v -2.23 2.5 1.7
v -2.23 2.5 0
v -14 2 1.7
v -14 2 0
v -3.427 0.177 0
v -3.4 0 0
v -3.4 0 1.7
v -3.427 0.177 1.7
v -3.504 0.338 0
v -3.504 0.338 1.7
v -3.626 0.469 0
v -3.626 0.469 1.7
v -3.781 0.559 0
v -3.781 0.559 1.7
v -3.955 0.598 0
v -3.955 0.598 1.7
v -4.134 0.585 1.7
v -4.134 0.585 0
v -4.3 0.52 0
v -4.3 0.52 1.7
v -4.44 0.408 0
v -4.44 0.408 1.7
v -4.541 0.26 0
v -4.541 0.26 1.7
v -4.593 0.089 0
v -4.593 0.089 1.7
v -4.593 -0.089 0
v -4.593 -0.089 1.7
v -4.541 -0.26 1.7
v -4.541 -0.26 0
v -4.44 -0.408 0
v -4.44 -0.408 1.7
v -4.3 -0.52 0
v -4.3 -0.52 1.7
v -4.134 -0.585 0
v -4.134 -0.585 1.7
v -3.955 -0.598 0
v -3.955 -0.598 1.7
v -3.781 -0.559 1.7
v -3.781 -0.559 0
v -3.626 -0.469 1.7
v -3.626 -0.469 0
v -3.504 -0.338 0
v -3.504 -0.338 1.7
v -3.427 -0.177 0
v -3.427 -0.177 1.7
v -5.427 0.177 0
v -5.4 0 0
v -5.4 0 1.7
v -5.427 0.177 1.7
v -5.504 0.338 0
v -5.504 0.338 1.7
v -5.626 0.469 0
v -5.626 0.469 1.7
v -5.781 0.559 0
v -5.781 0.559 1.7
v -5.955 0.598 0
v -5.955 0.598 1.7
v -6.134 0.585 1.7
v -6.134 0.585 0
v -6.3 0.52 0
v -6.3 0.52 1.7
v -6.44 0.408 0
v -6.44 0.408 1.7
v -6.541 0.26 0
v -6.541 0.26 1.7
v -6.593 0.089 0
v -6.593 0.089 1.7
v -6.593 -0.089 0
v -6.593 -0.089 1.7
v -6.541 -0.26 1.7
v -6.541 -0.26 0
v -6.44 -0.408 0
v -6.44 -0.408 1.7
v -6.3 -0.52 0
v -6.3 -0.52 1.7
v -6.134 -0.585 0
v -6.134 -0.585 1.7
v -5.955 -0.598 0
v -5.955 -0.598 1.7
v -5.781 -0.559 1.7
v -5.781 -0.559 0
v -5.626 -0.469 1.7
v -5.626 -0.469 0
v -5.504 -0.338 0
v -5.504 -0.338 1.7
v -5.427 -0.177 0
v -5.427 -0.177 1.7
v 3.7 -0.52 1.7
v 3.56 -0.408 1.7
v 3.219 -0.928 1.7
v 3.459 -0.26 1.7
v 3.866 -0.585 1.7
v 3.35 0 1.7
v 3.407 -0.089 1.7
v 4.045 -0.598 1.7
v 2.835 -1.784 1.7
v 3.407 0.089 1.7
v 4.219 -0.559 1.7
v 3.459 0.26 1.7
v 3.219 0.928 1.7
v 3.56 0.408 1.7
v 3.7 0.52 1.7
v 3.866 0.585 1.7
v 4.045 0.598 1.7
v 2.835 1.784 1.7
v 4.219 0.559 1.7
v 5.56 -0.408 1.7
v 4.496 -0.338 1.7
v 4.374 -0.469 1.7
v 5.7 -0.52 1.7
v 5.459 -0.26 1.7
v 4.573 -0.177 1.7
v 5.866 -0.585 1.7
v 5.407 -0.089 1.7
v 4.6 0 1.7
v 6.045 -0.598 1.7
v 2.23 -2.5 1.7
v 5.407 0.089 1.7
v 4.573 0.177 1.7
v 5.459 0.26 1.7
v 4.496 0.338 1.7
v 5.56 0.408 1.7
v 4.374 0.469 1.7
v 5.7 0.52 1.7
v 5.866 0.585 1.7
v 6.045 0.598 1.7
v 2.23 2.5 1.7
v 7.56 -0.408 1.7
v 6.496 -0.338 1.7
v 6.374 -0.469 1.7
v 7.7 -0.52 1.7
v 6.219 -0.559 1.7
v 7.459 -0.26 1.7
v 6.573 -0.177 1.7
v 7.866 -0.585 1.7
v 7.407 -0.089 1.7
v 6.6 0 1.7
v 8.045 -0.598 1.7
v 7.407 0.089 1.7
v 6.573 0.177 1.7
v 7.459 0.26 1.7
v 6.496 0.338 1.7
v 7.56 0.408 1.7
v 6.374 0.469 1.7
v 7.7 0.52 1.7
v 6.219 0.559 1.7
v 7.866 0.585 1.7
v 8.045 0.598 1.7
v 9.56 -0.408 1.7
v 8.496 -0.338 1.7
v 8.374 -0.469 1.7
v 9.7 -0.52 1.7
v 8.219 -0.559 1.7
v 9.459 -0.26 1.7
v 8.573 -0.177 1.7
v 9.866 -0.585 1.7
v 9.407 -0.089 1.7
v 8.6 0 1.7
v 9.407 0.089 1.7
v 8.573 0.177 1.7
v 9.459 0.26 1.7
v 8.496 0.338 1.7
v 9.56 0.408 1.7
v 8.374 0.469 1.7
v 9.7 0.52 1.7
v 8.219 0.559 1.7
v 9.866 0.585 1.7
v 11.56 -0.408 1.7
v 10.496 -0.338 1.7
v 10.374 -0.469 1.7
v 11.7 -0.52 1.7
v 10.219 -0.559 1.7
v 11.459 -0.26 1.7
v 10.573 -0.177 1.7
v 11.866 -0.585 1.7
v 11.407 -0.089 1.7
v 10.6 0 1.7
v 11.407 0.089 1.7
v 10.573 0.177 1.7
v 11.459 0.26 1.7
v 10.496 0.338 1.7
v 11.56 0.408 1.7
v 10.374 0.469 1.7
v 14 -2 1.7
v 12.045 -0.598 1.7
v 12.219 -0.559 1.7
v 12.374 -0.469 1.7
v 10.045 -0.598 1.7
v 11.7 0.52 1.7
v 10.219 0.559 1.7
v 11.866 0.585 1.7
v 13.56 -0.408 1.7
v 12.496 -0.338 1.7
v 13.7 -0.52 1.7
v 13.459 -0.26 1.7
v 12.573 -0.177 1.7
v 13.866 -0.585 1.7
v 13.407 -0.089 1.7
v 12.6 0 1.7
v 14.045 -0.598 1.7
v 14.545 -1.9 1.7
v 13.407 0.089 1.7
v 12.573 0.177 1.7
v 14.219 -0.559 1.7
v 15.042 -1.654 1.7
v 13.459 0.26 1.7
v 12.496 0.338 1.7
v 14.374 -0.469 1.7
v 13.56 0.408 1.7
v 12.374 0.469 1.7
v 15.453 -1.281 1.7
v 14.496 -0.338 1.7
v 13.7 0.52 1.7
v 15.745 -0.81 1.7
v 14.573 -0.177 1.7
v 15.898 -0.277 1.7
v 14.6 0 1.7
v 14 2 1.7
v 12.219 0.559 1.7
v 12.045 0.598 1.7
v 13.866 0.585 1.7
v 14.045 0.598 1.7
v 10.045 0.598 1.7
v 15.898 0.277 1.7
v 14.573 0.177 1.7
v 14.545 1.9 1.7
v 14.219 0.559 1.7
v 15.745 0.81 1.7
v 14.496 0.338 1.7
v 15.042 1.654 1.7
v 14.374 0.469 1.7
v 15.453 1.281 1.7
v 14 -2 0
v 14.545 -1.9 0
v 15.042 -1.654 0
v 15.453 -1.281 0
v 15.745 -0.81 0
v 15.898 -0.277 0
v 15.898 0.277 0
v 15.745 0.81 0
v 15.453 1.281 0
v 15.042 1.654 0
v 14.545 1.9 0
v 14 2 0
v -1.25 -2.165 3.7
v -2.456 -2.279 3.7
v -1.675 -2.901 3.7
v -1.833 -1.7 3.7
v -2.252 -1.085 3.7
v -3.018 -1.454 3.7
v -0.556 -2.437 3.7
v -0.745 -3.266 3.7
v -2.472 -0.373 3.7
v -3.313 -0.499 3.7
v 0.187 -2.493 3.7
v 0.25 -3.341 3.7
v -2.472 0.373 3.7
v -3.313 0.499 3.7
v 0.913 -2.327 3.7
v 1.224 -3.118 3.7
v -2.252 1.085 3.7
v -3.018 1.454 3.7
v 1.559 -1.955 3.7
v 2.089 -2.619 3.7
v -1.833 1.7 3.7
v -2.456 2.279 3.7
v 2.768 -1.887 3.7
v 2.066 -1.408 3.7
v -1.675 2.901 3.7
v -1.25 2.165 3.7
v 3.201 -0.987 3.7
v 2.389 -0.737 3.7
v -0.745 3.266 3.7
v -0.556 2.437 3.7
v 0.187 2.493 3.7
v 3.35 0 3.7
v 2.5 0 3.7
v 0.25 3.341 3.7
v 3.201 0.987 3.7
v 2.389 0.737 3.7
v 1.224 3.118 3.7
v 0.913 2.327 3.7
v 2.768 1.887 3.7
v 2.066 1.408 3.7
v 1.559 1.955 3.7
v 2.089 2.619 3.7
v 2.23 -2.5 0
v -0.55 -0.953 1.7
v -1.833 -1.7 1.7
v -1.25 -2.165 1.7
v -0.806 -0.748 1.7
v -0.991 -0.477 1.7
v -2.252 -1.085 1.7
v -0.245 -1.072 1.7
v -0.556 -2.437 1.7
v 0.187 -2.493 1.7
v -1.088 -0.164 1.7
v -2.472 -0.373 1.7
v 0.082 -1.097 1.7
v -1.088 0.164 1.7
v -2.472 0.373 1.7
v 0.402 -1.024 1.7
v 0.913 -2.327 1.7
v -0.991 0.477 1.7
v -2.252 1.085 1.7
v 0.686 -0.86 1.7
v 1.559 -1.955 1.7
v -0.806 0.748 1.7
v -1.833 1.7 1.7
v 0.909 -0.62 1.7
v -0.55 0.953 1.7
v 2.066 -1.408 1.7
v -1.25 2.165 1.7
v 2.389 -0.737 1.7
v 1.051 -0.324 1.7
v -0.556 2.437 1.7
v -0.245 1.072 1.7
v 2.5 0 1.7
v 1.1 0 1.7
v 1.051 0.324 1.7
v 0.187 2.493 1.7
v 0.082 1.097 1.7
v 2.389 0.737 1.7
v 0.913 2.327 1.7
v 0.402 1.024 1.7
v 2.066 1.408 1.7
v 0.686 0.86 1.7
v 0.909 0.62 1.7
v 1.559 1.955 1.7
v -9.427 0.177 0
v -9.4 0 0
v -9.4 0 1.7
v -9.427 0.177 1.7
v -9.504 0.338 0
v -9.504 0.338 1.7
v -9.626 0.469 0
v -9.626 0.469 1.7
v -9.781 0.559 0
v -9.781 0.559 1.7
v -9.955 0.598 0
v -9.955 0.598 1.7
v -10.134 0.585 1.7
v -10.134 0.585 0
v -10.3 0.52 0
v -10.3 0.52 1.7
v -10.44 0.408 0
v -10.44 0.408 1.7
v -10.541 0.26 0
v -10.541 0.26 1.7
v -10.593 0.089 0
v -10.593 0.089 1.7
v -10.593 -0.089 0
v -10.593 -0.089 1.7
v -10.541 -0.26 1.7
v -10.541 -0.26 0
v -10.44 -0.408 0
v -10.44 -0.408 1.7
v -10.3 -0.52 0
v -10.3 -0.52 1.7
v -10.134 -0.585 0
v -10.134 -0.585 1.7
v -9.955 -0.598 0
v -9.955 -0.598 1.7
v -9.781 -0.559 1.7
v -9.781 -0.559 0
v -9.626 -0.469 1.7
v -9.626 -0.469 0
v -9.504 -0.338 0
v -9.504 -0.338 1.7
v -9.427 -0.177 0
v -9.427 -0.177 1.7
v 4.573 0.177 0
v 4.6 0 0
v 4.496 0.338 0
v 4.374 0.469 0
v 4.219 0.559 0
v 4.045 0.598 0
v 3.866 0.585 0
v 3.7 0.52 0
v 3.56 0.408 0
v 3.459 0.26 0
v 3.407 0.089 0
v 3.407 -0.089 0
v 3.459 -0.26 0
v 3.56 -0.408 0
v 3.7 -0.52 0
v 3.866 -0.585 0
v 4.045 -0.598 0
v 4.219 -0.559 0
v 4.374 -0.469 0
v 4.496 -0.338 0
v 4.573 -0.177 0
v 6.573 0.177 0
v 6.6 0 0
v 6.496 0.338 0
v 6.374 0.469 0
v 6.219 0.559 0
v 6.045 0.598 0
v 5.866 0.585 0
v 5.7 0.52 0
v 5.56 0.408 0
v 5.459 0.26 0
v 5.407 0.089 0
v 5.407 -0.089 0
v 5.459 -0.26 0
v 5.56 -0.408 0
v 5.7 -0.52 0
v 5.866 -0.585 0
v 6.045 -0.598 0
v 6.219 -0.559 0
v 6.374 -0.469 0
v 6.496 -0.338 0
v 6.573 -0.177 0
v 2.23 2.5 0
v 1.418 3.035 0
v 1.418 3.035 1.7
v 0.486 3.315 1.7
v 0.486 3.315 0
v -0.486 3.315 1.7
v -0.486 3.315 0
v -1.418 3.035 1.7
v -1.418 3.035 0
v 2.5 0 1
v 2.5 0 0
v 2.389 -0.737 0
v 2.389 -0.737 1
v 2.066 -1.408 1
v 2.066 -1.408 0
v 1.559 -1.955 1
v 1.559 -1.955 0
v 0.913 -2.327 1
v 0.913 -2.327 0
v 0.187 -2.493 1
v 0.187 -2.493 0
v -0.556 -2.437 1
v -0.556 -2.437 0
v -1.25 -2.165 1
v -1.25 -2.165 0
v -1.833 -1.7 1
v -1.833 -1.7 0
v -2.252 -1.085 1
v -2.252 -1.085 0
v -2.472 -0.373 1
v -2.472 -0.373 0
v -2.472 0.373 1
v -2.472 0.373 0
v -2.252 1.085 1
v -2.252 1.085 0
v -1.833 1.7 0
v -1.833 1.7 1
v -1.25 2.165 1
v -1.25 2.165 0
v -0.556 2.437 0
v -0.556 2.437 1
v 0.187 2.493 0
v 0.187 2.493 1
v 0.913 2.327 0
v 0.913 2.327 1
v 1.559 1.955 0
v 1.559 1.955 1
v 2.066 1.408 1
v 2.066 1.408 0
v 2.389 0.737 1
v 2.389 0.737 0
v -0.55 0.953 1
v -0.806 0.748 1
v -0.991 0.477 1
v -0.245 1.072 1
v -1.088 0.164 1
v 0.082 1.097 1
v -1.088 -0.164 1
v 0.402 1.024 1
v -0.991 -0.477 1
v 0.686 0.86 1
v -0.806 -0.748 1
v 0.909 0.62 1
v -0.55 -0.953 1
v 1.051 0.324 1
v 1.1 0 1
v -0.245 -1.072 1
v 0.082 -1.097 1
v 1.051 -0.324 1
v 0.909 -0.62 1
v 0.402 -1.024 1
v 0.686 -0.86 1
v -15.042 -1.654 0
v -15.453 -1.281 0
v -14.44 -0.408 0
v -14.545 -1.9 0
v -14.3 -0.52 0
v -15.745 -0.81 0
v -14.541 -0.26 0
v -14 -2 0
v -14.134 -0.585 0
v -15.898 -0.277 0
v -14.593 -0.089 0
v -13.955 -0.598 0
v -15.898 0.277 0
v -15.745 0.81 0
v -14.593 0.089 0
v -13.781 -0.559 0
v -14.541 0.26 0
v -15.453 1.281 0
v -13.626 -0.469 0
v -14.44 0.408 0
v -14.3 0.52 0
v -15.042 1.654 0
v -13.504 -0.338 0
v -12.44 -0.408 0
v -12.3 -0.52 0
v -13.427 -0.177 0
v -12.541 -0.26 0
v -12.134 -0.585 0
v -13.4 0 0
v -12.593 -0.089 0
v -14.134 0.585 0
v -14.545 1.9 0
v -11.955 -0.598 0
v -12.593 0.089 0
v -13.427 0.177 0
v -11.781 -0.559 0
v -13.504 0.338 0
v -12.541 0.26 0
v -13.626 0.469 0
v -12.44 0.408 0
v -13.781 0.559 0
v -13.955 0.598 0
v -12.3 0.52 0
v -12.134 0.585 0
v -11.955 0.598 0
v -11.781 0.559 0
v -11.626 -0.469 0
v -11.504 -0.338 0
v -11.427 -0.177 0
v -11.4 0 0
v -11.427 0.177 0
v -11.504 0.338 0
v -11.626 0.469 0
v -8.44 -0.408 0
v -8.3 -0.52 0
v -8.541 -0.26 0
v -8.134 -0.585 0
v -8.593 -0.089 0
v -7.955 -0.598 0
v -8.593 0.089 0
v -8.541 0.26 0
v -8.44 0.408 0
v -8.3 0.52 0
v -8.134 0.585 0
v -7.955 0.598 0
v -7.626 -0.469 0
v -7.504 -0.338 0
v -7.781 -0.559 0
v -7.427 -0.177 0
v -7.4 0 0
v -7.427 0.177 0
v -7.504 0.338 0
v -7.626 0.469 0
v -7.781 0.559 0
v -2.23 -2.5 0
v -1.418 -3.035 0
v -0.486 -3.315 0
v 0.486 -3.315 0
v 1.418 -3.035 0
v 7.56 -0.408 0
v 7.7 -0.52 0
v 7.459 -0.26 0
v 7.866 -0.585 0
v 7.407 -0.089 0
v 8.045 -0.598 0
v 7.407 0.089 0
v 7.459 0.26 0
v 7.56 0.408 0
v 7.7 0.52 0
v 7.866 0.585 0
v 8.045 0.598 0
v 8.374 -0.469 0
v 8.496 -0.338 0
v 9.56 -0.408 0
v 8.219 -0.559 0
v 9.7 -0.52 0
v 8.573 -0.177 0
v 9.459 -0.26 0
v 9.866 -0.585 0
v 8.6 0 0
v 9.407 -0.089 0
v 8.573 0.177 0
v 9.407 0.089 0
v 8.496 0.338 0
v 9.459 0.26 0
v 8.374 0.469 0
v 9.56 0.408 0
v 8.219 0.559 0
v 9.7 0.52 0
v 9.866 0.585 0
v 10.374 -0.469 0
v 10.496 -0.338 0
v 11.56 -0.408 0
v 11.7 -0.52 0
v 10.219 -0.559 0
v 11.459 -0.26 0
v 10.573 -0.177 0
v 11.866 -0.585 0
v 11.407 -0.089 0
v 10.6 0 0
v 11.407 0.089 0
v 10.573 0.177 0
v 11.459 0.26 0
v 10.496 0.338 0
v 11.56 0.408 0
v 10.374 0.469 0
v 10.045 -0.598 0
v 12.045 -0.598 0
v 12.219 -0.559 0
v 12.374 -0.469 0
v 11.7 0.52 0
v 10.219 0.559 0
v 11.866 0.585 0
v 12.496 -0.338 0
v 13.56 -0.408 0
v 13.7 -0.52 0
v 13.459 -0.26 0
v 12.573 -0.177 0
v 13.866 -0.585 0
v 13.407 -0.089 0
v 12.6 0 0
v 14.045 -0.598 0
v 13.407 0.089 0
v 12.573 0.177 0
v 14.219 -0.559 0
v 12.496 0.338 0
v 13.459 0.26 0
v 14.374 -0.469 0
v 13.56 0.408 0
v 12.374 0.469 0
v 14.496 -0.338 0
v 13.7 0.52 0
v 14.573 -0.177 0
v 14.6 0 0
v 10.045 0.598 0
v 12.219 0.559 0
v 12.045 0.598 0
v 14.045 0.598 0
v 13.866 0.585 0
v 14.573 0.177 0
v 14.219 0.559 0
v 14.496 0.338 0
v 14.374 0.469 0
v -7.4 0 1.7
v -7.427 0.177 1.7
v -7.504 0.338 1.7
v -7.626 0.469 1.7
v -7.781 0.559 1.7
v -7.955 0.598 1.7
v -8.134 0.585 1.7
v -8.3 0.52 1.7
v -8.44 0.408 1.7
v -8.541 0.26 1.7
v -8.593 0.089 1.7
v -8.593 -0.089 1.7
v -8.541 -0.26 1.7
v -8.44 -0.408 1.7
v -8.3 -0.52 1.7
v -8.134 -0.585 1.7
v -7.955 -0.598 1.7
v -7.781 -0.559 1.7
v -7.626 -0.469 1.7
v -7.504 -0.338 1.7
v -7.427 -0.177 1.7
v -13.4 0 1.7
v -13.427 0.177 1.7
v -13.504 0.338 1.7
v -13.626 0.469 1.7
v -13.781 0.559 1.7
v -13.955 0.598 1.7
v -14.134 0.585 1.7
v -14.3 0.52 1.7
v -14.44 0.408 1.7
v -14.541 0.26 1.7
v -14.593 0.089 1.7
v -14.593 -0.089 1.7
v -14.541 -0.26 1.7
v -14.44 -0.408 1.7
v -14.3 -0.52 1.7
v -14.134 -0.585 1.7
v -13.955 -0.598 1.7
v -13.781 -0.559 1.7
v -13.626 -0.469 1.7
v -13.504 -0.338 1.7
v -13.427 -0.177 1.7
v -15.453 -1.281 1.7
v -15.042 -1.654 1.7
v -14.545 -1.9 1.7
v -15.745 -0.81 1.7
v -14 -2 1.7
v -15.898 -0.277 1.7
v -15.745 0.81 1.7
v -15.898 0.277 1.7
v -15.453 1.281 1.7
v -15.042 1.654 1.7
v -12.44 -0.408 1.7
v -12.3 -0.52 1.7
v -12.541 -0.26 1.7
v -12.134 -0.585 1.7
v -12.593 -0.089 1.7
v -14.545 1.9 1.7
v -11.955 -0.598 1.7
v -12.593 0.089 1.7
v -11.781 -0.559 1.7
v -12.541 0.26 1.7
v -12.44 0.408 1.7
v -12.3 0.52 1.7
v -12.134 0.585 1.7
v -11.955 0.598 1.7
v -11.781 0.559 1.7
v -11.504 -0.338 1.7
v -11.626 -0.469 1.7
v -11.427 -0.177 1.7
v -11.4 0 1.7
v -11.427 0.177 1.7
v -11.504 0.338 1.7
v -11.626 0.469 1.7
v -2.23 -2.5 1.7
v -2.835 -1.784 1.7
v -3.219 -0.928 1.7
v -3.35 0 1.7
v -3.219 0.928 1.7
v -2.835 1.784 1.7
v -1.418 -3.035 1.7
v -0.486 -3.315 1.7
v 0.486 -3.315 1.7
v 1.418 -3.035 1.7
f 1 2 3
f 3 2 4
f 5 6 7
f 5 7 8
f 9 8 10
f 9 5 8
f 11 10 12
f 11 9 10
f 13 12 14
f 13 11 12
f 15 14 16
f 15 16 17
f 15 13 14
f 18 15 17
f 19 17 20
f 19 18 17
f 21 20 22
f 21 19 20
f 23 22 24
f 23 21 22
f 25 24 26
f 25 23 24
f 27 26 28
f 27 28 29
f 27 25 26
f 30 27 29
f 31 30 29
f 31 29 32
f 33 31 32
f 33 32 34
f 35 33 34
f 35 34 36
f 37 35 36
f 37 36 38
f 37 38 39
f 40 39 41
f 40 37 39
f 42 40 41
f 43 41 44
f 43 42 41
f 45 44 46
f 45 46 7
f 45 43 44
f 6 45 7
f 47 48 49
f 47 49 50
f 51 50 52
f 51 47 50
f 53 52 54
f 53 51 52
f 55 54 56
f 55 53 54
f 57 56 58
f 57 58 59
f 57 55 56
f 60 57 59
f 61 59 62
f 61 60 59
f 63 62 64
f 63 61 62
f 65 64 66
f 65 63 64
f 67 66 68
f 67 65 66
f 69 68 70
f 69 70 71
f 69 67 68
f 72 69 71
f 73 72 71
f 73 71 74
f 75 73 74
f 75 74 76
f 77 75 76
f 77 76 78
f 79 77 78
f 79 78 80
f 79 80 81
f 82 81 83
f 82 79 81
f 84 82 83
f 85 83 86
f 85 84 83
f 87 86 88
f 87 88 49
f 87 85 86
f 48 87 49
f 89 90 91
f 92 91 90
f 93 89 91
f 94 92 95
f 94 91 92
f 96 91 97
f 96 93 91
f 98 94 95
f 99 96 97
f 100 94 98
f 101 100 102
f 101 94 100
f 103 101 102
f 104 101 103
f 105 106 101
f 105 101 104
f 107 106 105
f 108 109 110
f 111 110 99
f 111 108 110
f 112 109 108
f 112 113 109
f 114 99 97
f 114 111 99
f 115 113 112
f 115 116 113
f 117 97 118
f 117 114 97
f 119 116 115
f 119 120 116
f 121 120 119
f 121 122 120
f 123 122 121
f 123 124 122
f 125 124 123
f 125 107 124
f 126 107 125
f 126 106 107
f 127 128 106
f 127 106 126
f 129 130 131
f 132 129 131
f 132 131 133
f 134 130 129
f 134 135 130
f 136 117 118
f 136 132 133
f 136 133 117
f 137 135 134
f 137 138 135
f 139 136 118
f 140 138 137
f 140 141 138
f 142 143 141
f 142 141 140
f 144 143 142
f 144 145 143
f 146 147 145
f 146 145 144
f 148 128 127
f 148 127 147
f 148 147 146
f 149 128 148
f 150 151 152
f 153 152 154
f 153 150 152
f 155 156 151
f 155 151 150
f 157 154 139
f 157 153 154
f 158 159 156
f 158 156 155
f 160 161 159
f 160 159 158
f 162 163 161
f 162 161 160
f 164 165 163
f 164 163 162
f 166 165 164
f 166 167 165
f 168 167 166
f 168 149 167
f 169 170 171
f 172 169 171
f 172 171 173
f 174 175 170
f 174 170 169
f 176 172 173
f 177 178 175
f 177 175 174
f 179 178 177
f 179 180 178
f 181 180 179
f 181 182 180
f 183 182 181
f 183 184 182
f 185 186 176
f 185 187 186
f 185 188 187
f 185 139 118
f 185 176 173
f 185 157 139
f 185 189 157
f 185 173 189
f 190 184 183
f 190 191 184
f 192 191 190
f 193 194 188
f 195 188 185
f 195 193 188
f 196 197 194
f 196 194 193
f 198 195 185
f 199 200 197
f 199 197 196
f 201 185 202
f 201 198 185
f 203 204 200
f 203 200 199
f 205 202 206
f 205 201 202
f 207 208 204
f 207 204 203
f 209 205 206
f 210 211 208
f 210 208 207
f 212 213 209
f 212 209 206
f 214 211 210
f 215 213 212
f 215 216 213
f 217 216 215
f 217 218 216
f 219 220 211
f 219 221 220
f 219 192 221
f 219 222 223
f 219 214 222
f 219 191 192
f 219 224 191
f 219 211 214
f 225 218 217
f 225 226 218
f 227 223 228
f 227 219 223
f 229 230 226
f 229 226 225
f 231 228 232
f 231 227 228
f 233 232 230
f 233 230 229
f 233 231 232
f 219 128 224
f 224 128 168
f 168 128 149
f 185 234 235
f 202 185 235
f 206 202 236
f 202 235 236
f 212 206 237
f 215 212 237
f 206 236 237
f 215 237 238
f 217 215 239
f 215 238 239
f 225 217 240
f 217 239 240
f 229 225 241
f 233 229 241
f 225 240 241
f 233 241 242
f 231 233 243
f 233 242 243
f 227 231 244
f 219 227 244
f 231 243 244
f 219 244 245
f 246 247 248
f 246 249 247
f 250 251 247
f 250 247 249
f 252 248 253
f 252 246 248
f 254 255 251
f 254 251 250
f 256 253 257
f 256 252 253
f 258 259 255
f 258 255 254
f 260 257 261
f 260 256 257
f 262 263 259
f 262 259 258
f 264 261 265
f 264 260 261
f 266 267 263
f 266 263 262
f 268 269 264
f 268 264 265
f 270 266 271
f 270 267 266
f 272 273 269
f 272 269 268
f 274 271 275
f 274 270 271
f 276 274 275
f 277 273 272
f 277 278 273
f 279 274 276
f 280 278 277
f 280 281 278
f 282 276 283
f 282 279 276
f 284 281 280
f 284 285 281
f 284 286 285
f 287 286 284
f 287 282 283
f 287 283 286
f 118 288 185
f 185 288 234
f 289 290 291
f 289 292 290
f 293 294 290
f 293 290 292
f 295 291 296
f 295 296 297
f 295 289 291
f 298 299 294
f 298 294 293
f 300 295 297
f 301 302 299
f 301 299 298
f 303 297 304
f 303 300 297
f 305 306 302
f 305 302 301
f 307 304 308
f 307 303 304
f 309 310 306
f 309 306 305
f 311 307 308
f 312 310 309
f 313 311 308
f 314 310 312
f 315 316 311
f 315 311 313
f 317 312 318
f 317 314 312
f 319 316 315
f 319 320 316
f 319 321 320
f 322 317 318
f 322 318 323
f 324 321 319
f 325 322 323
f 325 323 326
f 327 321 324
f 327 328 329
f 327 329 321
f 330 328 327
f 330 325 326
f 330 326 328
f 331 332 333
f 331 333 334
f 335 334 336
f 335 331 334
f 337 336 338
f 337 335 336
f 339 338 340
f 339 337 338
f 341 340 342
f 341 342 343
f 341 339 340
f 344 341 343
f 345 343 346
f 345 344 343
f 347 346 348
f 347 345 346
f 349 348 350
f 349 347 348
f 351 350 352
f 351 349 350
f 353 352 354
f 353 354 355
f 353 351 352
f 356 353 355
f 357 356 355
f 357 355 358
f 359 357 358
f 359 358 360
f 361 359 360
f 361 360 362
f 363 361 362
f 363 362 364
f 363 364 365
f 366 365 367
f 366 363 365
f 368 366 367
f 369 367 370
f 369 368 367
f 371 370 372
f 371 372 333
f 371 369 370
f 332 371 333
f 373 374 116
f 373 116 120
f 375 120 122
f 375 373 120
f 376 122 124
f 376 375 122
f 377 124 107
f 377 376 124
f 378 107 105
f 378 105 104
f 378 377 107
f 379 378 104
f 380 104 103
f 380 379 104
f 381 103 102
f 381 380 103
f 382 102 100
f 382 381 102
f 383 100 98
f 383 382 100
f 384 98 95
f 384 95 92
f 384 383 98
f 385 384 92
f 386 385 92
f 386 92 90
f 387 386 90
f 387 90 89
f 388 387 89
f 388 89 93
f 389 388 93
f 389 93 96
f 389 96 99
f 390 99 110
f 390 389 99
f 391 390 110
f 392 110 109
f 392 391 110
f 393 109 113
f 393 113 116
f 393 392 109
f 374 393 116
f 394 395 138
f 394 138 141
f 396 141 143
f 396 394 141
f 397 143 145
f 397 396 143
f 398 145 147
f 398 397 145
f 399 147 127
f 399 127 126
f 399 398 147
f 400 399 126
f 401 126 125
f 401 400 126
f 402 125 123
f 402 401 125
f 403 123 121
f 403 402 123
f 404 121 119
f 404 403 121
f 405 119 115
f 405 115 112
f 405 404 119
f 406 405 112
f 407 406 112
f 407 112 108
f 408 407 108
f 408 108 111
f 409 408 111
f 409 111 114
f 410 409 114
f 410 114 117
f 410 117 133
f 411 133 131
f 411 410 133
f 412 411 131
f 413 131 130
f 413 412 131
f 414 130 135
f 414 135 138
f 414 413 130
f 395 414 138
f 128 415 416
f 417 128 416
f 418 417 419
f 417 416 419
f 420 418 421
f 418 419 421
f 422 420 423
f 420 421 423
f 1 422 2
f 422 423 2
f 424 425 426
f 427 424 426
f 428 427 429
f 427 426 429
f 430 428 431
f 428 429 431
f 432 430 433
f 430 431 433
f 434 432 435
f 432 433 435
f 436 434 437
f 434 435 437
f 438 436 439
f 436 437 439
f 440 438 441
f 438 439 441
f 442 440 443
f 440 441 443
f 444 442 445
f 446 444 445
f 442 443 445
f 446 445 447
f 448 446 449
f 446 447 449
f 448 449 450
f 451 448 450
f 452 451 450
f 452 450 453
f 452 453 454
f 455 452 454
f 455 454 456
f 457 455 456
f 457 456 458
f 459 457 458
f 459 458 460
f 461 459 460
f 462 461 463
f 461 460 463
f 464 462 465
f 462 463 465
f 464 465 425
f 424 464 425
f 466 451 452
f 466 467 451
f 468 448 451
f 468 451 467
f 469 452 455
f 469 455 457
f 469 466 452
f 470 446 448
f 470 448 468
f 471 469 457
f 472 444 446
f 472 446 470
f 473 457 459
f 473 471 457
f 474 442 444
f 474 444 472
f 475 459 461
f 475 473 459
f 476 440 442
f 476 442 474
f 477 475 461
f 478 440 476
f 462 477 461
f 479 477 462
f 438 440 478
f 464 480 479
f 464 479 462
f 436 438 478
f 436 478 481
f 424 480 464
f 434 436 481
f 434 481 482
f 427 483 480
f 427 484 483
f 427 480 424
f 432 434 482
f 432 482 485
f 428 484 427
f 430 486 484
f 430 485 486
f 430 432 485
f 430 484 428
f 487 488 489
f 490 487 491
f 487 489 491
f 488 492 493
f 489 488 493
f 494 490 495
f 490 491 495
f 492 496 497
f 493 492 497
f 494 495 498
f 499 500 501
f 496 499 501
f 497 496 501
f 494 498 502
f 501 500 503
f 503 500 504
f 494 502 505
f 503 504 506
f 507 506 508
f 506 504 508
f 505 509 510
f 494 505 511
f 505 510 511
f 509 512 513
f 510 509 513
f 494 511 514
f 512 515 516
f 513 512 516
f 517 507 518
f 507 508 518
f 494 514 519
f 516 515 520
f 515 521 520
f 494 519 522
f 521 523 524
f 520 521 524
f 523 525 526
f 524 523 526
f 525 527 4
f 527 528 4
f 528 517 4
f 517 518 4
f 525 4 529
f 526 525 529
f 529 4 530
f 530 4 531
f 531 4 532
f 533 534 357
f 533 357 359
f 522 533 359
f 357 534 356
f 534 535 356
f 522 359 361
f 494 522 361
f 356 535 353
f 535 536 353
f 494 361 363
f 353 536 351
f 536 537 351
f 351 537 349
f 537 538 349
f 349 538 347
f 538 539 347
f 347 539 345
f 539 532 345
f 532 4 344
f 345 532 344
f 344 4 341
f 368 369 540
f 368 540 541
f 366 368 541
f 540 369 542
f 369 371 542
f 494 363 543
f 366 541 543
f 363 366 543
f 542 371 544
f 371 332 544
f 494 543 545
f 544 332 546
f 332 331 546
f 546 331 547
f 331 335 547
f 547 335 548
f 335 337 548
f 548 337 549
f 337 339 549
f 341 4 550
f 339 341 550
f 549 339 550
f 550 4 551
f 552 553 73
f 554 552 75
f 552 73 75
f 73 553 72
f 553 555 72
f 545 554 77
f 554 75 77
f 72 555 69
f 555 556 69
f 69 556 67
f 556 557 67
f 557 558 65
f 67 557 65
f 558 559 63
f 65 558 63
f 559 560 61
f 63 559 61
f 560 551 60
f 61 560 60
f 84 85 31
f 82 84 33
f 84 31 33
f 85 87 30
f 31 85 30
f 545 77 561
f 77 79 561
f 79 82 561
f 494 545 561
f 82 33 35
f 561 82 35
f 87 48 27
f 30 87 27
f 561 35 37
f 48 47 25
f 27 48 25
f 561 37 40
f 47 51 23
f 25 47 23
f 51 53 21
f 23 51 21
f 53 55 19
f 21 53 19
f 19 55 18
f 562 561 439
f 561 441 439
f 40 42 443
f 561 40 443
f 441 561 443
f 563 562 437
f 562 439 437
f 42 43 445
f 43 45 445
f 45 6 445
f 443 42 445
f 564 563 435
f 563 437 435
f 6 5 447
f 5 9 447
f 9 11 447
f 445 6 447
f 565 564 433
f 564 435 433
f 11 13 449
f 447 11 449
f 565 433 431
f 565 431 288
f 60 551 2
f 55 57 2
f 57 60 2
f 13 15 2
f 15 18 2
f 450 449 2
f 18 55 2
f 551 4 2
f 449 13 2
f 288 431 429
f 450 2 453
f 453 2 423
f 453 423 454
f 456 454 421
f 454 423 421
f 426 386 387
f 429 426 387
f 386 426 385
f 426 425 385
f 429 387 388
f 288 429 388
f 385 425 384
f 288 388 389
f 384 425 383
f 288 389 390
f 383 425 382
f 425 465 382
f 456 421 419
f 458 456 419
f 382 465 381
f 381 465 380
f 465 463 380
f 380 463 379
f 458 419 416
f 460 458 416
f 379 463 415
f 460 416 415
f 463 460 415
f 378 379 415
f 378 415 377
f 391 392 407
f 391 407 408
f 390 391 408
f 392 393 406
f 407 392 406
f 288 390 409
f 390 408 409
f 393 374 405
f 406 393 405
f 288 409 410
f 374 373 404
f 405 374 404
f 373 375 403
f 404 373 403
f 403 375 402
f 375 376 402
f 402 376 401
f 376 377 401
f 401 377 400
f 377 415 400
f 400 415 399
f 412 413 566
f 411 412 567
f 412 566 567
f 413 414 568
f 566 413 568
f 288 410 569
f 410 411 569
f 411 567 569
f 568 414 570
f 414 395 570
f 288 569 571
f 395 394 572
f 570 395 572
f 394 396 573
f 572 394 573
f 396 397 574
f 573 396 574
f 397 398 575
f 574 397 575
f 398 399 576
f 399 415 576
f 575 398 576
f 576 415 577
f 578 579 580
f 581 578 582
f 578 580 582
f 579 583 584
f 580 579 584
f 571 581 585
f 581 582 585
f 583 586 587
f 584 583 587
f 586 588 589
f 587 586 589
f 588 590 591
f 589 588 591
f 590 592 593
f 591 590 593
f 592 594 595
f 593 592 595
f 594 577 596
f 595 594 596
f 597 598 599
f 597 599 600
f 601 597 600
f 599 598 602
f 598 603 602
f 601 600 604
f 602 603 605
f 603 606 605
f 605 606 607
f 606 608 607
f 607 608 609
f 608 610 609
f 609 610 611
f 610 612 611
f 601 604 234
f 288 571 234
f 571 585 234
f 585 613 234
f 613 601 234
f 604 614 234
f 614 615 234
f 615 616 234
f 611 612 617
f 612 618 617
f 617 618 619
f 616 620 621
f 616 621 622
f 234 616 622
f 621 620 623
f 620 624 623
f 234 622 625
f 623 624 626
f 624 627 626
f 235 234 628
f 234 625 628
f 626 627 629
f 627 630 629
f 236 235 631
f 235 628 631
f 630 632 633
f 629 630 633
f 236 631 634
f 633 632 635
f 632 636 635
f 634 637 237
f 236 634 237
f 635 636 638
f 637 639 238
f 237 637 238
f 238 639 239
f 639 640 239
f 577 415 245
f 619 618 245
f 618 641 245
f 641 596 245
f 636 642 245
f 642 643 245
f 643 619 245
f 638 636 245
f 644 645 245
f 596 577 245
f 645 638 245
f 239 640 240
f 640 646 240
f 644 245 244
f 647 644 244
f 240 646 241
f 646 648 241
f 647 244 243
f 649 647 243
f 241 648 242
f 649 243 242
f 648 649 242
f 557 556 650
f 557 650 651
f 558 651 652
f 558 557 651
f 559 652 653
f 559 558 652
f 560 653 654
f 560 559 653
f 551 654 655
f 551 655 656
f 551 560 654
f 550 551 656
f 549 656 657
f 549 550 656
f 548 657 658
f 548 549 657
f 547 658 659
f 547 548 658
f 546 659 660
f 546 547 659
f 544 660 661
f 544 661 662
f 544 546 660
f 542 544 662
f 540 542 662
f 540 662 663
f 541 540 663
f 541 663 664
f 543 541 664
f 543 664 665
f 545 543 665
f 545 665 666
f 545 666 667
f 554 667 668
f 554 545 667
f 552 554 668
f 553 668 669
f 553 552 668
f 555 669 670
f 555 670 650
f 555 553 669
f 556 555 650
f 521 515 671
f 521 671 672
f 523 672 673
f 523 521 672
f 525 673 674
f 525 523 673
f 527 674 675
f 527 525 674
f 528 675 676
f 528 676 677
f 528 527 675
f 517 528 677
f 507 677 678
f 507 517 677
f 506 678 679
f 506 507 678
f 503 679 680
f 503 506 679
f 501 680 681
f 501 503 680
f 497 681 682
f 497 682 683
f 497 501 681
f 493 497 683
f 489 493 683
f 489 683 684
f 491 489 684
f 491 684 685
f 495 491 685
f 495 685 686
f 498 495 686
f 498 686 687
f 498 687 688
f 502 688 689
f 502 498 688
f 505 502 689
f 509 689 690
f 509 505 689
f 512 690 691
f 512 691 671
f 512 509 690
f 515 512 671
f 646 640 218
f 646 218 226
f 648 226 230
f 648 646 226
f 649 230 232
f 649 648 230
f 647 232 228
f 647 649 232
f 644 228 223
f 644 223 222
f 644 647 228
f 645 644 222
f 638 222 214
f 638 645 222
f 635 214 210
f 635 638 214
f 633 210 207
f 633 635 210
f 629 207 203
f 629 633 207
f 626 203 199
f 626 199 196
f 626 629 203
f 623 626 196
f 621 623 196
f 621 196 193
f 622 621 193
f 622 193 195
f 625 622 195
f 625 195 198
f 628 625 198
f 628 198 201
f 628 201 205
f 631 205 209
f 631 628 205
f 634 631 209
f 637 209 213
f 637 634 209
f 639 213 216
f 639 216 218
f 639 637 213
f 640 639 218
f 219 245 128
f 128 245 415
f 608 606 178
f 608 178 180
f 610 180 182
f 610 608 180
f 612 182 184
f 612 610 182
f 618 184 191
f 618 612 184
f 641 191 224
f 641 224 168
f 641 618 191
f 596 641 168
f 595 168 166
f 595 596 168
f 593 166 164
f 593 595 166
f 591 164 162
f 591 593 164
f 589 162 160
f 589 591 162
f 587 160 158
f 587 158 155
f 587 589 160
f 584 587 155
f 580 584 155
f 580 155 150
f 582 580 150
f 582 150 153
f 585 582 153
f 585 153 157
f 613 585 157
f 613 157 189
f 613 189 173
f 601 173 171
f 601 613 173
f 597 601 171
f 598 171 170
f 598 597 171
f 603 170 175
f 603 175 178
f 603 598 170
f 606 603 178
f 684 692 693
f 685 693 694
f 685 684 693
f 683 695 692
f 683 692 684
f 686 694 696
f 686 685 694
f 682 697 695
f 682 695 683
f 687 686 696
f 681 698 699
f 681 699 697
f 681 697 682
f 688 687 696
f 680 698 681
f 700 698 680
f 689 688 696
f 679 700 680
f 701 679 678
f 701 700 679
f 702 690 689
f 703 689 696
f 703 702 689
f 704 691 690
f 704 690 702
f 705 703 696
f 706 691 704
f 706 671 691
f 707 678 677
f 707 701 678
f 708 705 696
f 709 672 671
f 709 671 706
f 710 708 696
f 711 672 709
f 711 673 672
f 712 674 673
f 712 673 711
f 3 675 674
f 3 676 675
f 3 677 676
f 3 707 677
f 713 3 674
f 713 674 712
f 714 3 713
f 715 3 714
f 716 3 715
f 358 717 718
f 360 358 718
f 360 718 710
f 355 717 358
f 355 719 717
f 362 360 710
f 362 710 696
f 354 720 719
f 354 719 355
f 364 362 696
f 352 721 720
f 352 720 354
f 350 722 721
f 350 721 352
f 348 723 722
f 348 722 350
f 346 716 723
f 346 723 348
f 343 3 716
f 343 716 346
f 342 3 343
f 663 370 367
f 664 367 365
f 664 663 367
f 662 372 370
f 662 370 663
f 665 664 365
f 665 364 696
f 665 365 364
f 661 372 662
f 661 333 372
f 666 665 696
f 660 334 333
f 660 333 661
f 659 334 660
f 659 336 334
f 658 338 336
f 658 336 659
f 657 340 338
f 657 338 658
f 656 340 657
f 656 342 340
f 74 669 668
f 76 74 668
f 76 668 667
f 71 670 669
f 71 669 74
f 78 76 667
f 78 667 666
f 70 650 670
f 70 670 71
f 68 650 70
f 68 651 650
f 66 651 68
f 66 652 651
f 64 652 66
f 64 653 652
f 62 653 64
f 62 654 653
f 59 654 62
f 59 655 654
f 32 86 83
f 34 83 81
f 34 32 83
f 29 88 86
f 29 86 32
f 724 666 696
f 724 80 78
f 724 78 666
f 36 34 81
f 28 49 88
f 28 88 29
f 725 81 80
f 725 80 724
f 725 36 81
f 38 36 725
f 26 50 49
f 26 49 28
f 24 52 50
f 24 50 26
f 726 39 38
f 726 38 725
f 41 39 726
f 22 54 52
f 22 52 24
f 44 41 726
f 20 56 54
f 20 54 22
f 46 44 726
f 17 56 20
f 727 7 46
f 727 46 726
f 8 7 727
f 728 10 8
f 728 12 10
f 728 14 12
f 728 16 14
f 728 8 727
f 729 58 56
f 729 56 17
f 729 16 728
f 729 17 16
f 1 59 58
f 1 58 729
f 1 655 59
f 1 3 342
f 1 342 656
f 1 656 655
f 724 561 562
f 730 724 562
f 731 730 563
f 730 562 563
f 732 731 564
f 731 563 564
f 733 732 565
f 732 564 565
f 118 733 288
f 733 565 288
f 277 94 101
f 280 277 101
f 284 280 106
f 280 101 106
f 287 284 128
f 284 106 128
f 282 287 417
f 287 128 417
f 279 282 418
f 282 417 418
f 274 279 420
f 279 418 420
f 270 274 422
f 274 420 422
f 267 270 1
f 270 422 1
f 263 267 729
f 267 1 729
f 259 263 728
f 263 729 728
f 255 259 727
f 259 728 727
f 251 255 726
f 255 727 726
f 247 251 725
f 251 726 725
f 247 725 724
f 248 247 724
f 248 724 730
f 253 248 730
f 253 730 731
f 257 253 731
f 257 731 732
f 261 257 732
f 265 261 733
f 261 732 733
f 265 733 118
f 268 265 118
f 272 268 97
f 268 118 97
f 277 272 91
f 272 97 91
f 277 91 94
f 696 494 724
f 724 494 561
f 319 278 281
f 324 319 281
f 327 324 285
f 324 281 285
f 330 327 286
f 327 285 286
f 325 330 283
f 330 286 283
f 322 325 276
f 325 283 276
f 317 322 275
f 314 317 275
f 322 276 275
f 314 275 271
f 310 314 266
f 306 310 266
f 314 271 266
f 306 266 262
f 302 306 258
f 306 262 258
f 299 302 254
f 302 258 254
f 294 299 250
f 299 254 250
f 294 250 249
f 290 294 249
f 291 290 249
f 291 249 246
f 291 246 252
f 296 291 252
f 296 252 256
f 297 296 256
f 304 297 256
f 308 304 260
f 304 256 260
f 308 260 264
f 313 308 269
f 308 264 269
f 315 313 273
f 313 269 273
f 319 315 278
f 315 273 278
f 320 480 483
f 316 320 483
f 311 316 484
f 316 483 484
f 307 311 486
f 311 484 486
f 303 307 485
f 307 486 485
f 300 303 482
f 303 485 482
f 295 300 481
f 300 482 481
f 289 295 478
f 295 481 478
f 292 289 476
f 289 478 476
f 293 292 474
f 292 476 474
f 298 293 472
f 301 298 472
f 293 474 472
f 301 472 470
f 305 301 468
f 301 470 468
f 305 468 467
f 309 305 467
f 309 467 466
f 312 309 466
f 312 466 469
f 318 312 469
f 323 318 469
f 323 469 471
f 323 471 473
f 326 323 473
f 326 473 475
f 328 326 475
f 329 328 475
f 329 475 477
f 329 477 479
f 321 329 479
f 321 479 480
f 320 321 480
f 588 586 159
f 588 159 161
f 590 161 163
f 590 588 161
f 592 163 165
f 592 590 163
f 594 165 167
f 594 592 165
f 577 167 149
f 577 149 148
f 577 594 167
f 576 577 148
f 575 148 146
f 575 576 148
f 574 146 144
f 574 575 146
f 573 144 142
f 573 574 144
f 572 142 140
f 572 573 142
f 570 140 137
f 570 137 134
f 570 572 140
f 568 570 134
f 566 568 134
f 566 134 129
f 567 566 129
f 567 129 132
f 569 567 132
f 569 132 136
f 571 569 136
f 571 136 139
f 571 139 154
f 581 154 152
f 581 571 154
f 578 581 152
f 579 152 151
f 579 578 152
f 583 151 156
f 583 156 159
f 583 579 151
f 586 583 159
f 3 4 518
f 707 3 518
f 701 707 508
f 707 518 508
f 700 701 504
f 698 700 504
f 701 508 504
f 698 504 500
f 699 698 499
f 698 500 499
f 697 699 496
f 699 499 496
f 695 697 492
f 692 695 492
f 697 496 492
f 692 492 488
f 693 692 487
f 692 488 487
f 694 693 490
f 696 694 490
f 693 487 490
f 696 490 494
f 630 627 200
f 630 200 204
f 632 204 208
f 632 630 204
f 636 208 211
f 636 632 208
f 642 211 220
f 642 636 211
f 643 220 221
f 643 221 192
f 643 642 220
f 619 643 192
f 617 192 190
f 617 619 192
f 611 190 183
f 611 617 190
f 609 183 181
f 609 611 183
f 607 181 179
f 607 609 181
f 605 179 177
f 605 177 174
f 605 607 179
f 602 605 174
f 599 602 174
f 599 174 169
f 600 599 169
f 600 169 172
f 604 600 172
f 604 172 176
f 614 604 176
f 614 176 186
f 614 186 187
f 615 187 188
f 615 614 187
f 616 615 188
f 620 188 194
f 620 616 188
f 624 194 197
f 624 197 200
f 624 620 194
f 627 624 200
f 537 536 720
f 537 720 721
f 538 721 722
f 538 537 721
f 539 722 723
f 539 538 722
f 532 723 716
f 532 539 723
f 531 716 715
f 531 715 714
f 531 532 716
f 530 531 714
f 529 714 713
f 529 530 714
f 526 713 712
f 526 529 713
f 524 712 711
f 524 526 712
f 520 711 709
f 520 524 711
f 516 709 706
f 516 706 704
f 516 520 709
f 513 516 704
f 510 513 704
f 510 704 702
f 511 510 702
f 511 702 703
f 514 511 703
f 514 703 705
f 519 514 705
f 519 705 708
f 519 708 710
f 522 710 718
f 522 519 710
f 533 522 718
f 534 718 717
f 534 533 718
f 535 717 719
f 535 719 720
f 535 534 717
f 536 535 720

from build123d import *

# Parameters (mm, degrees)
F0_R     = 0.6
F1_DEPTH = 1.7
F2_R     = 3.35
F3_DEPTH = 2
F4_R     = 2.5
F5_DEPTH = 1
F6_R     = 1.1
F7_DEPTH = 2.701
F8_R     = 2.5
F9_DEPTH = 2


with BuildPart() as f1:
    # F0 (on Top) → F1 (new body)
    with BuildSketch(Plane.XY):
        with BuildLine():
            ThreePointArc((2.2299103121, -2.5), (3.057180036, -1.369726333), (3.35, 0))
            ThreePointArc((3.35, 0), (3.057180036, 1.369726333), (2.2299103121, 2.5))
            ThreePointArc((2.2299103121, 2.5), (0, 3.35), (-2.2299103121, 2.5))
            ThreePointArc((-2.2299103121, 2.5), (-3.35, 0), (-2.2299103121, -2.5))
            ThreePointArc((-2.2299103121, -2.5), (0, -3.35), (2.2299103121, -2.5))
        make_face()
        with BuildLine():
            ThreePointArc((2.2299103121, 2.5), (3.057180036, 1.369726333), (3.35, 0))
            ThreePointArc((3.35, 0), (3.057180036, -1.369726333), (2.2299103121, -2.5))
            Line((2.2299103121, -2.5), (14, -2))
            ThreePointArc((14, -2), (15.9168426648, 0), (14, 2))
            Line((14, 2), (2.2299103121, 2.5))
        make_face()
        with Locations((4, 0)):
            Circle(F0_R, mode=Mode.SUBTRACT)
        with Locations((6, 0)):
            Circle(F0_R, mode=Mode.SUBTRACT)
        with Locations((8, 0)):
            Circle(F0_R, mode=Mode.SUBTRACT)
        with Locations((10, 0)):
            Circle(F0_R, mode=Mode.SUBTRACT)
        with Locations((12, 0)):
            Circle(F0_R, mode=Mode.SUBTRACT)
        with Locations((14, 0)):
            Circle(F0_R, mode=Mode.SUBTRACT)
        with BuildLine():
            ThreePointArc((-2.2299103121, -2.5), (-3.35, 0), (-2.2299103121, 2.5))
            Line((-2.2299103121, 2.5), (-14, 2))
            ThreePointArc((-14, 2), (-15.9168426648, 0), (-14, -2))
            Line((-14, -2), (-2.2299103121, -2.5))
        make_face()
        with Locations((-14, 0)):
            Circle(F0_R, mode=Mode.SUBTRACT)
        with Locations((-12, 0)):
            Circle(F0_R, mode=Mode.SUBTRACT)
        with Locations((-10, 0)):
            Circle(F0_R, mode=Mode.SUBTRACT)
        with Locations((-8, 0)):
            Circle(F0_R, mode=Mode.SUBTRACT)
        with Locations((-6, 0)):
            Circle(F0_R, mode=Mode.SUBTRACT)
        with Locations((-4, 0)):
            Circle(F0_R, mode=Mode.SUBTRACT)
    extrude(amount=F1_DEPTH)

    # F2 (on face) → F3 (join)
    with BuildSketch(Plane.XY.offset(1.7)):
        Circle(F2_R)
    extrude(amount=F3_DEPTH)

    # F4 (on face) → F5 (cut)
    with BuildSketch(Plane(origin=(0, 0, 0), x_dir=(1, 0, 0), z_dir=(0, 0, -1))):
        Circle(F4_R)
    extrude(amount=-F5_DEPTH, mode=Mode.SUBTRACT)

    # F6 (on face) → F7 (cut, through all)
    with BuildSketch(Plane(origin=(0, 0, 1), x_dir=(1, 0, 0), z_dir=(0, 0, -1))):
        Circle(F6_R)
    extrude(amount=-F7_DEPTH, mode=Mode.SUBTRACT)

    # F8 (on face) → F9 (cut)
    with BuildSketch(Plane.XY.offset(3.7)):
        Circle(F8_R)
    extrude(amount=-F9_DEPTH, mode=Mode.SUBTRACT)


solid = f1.part
